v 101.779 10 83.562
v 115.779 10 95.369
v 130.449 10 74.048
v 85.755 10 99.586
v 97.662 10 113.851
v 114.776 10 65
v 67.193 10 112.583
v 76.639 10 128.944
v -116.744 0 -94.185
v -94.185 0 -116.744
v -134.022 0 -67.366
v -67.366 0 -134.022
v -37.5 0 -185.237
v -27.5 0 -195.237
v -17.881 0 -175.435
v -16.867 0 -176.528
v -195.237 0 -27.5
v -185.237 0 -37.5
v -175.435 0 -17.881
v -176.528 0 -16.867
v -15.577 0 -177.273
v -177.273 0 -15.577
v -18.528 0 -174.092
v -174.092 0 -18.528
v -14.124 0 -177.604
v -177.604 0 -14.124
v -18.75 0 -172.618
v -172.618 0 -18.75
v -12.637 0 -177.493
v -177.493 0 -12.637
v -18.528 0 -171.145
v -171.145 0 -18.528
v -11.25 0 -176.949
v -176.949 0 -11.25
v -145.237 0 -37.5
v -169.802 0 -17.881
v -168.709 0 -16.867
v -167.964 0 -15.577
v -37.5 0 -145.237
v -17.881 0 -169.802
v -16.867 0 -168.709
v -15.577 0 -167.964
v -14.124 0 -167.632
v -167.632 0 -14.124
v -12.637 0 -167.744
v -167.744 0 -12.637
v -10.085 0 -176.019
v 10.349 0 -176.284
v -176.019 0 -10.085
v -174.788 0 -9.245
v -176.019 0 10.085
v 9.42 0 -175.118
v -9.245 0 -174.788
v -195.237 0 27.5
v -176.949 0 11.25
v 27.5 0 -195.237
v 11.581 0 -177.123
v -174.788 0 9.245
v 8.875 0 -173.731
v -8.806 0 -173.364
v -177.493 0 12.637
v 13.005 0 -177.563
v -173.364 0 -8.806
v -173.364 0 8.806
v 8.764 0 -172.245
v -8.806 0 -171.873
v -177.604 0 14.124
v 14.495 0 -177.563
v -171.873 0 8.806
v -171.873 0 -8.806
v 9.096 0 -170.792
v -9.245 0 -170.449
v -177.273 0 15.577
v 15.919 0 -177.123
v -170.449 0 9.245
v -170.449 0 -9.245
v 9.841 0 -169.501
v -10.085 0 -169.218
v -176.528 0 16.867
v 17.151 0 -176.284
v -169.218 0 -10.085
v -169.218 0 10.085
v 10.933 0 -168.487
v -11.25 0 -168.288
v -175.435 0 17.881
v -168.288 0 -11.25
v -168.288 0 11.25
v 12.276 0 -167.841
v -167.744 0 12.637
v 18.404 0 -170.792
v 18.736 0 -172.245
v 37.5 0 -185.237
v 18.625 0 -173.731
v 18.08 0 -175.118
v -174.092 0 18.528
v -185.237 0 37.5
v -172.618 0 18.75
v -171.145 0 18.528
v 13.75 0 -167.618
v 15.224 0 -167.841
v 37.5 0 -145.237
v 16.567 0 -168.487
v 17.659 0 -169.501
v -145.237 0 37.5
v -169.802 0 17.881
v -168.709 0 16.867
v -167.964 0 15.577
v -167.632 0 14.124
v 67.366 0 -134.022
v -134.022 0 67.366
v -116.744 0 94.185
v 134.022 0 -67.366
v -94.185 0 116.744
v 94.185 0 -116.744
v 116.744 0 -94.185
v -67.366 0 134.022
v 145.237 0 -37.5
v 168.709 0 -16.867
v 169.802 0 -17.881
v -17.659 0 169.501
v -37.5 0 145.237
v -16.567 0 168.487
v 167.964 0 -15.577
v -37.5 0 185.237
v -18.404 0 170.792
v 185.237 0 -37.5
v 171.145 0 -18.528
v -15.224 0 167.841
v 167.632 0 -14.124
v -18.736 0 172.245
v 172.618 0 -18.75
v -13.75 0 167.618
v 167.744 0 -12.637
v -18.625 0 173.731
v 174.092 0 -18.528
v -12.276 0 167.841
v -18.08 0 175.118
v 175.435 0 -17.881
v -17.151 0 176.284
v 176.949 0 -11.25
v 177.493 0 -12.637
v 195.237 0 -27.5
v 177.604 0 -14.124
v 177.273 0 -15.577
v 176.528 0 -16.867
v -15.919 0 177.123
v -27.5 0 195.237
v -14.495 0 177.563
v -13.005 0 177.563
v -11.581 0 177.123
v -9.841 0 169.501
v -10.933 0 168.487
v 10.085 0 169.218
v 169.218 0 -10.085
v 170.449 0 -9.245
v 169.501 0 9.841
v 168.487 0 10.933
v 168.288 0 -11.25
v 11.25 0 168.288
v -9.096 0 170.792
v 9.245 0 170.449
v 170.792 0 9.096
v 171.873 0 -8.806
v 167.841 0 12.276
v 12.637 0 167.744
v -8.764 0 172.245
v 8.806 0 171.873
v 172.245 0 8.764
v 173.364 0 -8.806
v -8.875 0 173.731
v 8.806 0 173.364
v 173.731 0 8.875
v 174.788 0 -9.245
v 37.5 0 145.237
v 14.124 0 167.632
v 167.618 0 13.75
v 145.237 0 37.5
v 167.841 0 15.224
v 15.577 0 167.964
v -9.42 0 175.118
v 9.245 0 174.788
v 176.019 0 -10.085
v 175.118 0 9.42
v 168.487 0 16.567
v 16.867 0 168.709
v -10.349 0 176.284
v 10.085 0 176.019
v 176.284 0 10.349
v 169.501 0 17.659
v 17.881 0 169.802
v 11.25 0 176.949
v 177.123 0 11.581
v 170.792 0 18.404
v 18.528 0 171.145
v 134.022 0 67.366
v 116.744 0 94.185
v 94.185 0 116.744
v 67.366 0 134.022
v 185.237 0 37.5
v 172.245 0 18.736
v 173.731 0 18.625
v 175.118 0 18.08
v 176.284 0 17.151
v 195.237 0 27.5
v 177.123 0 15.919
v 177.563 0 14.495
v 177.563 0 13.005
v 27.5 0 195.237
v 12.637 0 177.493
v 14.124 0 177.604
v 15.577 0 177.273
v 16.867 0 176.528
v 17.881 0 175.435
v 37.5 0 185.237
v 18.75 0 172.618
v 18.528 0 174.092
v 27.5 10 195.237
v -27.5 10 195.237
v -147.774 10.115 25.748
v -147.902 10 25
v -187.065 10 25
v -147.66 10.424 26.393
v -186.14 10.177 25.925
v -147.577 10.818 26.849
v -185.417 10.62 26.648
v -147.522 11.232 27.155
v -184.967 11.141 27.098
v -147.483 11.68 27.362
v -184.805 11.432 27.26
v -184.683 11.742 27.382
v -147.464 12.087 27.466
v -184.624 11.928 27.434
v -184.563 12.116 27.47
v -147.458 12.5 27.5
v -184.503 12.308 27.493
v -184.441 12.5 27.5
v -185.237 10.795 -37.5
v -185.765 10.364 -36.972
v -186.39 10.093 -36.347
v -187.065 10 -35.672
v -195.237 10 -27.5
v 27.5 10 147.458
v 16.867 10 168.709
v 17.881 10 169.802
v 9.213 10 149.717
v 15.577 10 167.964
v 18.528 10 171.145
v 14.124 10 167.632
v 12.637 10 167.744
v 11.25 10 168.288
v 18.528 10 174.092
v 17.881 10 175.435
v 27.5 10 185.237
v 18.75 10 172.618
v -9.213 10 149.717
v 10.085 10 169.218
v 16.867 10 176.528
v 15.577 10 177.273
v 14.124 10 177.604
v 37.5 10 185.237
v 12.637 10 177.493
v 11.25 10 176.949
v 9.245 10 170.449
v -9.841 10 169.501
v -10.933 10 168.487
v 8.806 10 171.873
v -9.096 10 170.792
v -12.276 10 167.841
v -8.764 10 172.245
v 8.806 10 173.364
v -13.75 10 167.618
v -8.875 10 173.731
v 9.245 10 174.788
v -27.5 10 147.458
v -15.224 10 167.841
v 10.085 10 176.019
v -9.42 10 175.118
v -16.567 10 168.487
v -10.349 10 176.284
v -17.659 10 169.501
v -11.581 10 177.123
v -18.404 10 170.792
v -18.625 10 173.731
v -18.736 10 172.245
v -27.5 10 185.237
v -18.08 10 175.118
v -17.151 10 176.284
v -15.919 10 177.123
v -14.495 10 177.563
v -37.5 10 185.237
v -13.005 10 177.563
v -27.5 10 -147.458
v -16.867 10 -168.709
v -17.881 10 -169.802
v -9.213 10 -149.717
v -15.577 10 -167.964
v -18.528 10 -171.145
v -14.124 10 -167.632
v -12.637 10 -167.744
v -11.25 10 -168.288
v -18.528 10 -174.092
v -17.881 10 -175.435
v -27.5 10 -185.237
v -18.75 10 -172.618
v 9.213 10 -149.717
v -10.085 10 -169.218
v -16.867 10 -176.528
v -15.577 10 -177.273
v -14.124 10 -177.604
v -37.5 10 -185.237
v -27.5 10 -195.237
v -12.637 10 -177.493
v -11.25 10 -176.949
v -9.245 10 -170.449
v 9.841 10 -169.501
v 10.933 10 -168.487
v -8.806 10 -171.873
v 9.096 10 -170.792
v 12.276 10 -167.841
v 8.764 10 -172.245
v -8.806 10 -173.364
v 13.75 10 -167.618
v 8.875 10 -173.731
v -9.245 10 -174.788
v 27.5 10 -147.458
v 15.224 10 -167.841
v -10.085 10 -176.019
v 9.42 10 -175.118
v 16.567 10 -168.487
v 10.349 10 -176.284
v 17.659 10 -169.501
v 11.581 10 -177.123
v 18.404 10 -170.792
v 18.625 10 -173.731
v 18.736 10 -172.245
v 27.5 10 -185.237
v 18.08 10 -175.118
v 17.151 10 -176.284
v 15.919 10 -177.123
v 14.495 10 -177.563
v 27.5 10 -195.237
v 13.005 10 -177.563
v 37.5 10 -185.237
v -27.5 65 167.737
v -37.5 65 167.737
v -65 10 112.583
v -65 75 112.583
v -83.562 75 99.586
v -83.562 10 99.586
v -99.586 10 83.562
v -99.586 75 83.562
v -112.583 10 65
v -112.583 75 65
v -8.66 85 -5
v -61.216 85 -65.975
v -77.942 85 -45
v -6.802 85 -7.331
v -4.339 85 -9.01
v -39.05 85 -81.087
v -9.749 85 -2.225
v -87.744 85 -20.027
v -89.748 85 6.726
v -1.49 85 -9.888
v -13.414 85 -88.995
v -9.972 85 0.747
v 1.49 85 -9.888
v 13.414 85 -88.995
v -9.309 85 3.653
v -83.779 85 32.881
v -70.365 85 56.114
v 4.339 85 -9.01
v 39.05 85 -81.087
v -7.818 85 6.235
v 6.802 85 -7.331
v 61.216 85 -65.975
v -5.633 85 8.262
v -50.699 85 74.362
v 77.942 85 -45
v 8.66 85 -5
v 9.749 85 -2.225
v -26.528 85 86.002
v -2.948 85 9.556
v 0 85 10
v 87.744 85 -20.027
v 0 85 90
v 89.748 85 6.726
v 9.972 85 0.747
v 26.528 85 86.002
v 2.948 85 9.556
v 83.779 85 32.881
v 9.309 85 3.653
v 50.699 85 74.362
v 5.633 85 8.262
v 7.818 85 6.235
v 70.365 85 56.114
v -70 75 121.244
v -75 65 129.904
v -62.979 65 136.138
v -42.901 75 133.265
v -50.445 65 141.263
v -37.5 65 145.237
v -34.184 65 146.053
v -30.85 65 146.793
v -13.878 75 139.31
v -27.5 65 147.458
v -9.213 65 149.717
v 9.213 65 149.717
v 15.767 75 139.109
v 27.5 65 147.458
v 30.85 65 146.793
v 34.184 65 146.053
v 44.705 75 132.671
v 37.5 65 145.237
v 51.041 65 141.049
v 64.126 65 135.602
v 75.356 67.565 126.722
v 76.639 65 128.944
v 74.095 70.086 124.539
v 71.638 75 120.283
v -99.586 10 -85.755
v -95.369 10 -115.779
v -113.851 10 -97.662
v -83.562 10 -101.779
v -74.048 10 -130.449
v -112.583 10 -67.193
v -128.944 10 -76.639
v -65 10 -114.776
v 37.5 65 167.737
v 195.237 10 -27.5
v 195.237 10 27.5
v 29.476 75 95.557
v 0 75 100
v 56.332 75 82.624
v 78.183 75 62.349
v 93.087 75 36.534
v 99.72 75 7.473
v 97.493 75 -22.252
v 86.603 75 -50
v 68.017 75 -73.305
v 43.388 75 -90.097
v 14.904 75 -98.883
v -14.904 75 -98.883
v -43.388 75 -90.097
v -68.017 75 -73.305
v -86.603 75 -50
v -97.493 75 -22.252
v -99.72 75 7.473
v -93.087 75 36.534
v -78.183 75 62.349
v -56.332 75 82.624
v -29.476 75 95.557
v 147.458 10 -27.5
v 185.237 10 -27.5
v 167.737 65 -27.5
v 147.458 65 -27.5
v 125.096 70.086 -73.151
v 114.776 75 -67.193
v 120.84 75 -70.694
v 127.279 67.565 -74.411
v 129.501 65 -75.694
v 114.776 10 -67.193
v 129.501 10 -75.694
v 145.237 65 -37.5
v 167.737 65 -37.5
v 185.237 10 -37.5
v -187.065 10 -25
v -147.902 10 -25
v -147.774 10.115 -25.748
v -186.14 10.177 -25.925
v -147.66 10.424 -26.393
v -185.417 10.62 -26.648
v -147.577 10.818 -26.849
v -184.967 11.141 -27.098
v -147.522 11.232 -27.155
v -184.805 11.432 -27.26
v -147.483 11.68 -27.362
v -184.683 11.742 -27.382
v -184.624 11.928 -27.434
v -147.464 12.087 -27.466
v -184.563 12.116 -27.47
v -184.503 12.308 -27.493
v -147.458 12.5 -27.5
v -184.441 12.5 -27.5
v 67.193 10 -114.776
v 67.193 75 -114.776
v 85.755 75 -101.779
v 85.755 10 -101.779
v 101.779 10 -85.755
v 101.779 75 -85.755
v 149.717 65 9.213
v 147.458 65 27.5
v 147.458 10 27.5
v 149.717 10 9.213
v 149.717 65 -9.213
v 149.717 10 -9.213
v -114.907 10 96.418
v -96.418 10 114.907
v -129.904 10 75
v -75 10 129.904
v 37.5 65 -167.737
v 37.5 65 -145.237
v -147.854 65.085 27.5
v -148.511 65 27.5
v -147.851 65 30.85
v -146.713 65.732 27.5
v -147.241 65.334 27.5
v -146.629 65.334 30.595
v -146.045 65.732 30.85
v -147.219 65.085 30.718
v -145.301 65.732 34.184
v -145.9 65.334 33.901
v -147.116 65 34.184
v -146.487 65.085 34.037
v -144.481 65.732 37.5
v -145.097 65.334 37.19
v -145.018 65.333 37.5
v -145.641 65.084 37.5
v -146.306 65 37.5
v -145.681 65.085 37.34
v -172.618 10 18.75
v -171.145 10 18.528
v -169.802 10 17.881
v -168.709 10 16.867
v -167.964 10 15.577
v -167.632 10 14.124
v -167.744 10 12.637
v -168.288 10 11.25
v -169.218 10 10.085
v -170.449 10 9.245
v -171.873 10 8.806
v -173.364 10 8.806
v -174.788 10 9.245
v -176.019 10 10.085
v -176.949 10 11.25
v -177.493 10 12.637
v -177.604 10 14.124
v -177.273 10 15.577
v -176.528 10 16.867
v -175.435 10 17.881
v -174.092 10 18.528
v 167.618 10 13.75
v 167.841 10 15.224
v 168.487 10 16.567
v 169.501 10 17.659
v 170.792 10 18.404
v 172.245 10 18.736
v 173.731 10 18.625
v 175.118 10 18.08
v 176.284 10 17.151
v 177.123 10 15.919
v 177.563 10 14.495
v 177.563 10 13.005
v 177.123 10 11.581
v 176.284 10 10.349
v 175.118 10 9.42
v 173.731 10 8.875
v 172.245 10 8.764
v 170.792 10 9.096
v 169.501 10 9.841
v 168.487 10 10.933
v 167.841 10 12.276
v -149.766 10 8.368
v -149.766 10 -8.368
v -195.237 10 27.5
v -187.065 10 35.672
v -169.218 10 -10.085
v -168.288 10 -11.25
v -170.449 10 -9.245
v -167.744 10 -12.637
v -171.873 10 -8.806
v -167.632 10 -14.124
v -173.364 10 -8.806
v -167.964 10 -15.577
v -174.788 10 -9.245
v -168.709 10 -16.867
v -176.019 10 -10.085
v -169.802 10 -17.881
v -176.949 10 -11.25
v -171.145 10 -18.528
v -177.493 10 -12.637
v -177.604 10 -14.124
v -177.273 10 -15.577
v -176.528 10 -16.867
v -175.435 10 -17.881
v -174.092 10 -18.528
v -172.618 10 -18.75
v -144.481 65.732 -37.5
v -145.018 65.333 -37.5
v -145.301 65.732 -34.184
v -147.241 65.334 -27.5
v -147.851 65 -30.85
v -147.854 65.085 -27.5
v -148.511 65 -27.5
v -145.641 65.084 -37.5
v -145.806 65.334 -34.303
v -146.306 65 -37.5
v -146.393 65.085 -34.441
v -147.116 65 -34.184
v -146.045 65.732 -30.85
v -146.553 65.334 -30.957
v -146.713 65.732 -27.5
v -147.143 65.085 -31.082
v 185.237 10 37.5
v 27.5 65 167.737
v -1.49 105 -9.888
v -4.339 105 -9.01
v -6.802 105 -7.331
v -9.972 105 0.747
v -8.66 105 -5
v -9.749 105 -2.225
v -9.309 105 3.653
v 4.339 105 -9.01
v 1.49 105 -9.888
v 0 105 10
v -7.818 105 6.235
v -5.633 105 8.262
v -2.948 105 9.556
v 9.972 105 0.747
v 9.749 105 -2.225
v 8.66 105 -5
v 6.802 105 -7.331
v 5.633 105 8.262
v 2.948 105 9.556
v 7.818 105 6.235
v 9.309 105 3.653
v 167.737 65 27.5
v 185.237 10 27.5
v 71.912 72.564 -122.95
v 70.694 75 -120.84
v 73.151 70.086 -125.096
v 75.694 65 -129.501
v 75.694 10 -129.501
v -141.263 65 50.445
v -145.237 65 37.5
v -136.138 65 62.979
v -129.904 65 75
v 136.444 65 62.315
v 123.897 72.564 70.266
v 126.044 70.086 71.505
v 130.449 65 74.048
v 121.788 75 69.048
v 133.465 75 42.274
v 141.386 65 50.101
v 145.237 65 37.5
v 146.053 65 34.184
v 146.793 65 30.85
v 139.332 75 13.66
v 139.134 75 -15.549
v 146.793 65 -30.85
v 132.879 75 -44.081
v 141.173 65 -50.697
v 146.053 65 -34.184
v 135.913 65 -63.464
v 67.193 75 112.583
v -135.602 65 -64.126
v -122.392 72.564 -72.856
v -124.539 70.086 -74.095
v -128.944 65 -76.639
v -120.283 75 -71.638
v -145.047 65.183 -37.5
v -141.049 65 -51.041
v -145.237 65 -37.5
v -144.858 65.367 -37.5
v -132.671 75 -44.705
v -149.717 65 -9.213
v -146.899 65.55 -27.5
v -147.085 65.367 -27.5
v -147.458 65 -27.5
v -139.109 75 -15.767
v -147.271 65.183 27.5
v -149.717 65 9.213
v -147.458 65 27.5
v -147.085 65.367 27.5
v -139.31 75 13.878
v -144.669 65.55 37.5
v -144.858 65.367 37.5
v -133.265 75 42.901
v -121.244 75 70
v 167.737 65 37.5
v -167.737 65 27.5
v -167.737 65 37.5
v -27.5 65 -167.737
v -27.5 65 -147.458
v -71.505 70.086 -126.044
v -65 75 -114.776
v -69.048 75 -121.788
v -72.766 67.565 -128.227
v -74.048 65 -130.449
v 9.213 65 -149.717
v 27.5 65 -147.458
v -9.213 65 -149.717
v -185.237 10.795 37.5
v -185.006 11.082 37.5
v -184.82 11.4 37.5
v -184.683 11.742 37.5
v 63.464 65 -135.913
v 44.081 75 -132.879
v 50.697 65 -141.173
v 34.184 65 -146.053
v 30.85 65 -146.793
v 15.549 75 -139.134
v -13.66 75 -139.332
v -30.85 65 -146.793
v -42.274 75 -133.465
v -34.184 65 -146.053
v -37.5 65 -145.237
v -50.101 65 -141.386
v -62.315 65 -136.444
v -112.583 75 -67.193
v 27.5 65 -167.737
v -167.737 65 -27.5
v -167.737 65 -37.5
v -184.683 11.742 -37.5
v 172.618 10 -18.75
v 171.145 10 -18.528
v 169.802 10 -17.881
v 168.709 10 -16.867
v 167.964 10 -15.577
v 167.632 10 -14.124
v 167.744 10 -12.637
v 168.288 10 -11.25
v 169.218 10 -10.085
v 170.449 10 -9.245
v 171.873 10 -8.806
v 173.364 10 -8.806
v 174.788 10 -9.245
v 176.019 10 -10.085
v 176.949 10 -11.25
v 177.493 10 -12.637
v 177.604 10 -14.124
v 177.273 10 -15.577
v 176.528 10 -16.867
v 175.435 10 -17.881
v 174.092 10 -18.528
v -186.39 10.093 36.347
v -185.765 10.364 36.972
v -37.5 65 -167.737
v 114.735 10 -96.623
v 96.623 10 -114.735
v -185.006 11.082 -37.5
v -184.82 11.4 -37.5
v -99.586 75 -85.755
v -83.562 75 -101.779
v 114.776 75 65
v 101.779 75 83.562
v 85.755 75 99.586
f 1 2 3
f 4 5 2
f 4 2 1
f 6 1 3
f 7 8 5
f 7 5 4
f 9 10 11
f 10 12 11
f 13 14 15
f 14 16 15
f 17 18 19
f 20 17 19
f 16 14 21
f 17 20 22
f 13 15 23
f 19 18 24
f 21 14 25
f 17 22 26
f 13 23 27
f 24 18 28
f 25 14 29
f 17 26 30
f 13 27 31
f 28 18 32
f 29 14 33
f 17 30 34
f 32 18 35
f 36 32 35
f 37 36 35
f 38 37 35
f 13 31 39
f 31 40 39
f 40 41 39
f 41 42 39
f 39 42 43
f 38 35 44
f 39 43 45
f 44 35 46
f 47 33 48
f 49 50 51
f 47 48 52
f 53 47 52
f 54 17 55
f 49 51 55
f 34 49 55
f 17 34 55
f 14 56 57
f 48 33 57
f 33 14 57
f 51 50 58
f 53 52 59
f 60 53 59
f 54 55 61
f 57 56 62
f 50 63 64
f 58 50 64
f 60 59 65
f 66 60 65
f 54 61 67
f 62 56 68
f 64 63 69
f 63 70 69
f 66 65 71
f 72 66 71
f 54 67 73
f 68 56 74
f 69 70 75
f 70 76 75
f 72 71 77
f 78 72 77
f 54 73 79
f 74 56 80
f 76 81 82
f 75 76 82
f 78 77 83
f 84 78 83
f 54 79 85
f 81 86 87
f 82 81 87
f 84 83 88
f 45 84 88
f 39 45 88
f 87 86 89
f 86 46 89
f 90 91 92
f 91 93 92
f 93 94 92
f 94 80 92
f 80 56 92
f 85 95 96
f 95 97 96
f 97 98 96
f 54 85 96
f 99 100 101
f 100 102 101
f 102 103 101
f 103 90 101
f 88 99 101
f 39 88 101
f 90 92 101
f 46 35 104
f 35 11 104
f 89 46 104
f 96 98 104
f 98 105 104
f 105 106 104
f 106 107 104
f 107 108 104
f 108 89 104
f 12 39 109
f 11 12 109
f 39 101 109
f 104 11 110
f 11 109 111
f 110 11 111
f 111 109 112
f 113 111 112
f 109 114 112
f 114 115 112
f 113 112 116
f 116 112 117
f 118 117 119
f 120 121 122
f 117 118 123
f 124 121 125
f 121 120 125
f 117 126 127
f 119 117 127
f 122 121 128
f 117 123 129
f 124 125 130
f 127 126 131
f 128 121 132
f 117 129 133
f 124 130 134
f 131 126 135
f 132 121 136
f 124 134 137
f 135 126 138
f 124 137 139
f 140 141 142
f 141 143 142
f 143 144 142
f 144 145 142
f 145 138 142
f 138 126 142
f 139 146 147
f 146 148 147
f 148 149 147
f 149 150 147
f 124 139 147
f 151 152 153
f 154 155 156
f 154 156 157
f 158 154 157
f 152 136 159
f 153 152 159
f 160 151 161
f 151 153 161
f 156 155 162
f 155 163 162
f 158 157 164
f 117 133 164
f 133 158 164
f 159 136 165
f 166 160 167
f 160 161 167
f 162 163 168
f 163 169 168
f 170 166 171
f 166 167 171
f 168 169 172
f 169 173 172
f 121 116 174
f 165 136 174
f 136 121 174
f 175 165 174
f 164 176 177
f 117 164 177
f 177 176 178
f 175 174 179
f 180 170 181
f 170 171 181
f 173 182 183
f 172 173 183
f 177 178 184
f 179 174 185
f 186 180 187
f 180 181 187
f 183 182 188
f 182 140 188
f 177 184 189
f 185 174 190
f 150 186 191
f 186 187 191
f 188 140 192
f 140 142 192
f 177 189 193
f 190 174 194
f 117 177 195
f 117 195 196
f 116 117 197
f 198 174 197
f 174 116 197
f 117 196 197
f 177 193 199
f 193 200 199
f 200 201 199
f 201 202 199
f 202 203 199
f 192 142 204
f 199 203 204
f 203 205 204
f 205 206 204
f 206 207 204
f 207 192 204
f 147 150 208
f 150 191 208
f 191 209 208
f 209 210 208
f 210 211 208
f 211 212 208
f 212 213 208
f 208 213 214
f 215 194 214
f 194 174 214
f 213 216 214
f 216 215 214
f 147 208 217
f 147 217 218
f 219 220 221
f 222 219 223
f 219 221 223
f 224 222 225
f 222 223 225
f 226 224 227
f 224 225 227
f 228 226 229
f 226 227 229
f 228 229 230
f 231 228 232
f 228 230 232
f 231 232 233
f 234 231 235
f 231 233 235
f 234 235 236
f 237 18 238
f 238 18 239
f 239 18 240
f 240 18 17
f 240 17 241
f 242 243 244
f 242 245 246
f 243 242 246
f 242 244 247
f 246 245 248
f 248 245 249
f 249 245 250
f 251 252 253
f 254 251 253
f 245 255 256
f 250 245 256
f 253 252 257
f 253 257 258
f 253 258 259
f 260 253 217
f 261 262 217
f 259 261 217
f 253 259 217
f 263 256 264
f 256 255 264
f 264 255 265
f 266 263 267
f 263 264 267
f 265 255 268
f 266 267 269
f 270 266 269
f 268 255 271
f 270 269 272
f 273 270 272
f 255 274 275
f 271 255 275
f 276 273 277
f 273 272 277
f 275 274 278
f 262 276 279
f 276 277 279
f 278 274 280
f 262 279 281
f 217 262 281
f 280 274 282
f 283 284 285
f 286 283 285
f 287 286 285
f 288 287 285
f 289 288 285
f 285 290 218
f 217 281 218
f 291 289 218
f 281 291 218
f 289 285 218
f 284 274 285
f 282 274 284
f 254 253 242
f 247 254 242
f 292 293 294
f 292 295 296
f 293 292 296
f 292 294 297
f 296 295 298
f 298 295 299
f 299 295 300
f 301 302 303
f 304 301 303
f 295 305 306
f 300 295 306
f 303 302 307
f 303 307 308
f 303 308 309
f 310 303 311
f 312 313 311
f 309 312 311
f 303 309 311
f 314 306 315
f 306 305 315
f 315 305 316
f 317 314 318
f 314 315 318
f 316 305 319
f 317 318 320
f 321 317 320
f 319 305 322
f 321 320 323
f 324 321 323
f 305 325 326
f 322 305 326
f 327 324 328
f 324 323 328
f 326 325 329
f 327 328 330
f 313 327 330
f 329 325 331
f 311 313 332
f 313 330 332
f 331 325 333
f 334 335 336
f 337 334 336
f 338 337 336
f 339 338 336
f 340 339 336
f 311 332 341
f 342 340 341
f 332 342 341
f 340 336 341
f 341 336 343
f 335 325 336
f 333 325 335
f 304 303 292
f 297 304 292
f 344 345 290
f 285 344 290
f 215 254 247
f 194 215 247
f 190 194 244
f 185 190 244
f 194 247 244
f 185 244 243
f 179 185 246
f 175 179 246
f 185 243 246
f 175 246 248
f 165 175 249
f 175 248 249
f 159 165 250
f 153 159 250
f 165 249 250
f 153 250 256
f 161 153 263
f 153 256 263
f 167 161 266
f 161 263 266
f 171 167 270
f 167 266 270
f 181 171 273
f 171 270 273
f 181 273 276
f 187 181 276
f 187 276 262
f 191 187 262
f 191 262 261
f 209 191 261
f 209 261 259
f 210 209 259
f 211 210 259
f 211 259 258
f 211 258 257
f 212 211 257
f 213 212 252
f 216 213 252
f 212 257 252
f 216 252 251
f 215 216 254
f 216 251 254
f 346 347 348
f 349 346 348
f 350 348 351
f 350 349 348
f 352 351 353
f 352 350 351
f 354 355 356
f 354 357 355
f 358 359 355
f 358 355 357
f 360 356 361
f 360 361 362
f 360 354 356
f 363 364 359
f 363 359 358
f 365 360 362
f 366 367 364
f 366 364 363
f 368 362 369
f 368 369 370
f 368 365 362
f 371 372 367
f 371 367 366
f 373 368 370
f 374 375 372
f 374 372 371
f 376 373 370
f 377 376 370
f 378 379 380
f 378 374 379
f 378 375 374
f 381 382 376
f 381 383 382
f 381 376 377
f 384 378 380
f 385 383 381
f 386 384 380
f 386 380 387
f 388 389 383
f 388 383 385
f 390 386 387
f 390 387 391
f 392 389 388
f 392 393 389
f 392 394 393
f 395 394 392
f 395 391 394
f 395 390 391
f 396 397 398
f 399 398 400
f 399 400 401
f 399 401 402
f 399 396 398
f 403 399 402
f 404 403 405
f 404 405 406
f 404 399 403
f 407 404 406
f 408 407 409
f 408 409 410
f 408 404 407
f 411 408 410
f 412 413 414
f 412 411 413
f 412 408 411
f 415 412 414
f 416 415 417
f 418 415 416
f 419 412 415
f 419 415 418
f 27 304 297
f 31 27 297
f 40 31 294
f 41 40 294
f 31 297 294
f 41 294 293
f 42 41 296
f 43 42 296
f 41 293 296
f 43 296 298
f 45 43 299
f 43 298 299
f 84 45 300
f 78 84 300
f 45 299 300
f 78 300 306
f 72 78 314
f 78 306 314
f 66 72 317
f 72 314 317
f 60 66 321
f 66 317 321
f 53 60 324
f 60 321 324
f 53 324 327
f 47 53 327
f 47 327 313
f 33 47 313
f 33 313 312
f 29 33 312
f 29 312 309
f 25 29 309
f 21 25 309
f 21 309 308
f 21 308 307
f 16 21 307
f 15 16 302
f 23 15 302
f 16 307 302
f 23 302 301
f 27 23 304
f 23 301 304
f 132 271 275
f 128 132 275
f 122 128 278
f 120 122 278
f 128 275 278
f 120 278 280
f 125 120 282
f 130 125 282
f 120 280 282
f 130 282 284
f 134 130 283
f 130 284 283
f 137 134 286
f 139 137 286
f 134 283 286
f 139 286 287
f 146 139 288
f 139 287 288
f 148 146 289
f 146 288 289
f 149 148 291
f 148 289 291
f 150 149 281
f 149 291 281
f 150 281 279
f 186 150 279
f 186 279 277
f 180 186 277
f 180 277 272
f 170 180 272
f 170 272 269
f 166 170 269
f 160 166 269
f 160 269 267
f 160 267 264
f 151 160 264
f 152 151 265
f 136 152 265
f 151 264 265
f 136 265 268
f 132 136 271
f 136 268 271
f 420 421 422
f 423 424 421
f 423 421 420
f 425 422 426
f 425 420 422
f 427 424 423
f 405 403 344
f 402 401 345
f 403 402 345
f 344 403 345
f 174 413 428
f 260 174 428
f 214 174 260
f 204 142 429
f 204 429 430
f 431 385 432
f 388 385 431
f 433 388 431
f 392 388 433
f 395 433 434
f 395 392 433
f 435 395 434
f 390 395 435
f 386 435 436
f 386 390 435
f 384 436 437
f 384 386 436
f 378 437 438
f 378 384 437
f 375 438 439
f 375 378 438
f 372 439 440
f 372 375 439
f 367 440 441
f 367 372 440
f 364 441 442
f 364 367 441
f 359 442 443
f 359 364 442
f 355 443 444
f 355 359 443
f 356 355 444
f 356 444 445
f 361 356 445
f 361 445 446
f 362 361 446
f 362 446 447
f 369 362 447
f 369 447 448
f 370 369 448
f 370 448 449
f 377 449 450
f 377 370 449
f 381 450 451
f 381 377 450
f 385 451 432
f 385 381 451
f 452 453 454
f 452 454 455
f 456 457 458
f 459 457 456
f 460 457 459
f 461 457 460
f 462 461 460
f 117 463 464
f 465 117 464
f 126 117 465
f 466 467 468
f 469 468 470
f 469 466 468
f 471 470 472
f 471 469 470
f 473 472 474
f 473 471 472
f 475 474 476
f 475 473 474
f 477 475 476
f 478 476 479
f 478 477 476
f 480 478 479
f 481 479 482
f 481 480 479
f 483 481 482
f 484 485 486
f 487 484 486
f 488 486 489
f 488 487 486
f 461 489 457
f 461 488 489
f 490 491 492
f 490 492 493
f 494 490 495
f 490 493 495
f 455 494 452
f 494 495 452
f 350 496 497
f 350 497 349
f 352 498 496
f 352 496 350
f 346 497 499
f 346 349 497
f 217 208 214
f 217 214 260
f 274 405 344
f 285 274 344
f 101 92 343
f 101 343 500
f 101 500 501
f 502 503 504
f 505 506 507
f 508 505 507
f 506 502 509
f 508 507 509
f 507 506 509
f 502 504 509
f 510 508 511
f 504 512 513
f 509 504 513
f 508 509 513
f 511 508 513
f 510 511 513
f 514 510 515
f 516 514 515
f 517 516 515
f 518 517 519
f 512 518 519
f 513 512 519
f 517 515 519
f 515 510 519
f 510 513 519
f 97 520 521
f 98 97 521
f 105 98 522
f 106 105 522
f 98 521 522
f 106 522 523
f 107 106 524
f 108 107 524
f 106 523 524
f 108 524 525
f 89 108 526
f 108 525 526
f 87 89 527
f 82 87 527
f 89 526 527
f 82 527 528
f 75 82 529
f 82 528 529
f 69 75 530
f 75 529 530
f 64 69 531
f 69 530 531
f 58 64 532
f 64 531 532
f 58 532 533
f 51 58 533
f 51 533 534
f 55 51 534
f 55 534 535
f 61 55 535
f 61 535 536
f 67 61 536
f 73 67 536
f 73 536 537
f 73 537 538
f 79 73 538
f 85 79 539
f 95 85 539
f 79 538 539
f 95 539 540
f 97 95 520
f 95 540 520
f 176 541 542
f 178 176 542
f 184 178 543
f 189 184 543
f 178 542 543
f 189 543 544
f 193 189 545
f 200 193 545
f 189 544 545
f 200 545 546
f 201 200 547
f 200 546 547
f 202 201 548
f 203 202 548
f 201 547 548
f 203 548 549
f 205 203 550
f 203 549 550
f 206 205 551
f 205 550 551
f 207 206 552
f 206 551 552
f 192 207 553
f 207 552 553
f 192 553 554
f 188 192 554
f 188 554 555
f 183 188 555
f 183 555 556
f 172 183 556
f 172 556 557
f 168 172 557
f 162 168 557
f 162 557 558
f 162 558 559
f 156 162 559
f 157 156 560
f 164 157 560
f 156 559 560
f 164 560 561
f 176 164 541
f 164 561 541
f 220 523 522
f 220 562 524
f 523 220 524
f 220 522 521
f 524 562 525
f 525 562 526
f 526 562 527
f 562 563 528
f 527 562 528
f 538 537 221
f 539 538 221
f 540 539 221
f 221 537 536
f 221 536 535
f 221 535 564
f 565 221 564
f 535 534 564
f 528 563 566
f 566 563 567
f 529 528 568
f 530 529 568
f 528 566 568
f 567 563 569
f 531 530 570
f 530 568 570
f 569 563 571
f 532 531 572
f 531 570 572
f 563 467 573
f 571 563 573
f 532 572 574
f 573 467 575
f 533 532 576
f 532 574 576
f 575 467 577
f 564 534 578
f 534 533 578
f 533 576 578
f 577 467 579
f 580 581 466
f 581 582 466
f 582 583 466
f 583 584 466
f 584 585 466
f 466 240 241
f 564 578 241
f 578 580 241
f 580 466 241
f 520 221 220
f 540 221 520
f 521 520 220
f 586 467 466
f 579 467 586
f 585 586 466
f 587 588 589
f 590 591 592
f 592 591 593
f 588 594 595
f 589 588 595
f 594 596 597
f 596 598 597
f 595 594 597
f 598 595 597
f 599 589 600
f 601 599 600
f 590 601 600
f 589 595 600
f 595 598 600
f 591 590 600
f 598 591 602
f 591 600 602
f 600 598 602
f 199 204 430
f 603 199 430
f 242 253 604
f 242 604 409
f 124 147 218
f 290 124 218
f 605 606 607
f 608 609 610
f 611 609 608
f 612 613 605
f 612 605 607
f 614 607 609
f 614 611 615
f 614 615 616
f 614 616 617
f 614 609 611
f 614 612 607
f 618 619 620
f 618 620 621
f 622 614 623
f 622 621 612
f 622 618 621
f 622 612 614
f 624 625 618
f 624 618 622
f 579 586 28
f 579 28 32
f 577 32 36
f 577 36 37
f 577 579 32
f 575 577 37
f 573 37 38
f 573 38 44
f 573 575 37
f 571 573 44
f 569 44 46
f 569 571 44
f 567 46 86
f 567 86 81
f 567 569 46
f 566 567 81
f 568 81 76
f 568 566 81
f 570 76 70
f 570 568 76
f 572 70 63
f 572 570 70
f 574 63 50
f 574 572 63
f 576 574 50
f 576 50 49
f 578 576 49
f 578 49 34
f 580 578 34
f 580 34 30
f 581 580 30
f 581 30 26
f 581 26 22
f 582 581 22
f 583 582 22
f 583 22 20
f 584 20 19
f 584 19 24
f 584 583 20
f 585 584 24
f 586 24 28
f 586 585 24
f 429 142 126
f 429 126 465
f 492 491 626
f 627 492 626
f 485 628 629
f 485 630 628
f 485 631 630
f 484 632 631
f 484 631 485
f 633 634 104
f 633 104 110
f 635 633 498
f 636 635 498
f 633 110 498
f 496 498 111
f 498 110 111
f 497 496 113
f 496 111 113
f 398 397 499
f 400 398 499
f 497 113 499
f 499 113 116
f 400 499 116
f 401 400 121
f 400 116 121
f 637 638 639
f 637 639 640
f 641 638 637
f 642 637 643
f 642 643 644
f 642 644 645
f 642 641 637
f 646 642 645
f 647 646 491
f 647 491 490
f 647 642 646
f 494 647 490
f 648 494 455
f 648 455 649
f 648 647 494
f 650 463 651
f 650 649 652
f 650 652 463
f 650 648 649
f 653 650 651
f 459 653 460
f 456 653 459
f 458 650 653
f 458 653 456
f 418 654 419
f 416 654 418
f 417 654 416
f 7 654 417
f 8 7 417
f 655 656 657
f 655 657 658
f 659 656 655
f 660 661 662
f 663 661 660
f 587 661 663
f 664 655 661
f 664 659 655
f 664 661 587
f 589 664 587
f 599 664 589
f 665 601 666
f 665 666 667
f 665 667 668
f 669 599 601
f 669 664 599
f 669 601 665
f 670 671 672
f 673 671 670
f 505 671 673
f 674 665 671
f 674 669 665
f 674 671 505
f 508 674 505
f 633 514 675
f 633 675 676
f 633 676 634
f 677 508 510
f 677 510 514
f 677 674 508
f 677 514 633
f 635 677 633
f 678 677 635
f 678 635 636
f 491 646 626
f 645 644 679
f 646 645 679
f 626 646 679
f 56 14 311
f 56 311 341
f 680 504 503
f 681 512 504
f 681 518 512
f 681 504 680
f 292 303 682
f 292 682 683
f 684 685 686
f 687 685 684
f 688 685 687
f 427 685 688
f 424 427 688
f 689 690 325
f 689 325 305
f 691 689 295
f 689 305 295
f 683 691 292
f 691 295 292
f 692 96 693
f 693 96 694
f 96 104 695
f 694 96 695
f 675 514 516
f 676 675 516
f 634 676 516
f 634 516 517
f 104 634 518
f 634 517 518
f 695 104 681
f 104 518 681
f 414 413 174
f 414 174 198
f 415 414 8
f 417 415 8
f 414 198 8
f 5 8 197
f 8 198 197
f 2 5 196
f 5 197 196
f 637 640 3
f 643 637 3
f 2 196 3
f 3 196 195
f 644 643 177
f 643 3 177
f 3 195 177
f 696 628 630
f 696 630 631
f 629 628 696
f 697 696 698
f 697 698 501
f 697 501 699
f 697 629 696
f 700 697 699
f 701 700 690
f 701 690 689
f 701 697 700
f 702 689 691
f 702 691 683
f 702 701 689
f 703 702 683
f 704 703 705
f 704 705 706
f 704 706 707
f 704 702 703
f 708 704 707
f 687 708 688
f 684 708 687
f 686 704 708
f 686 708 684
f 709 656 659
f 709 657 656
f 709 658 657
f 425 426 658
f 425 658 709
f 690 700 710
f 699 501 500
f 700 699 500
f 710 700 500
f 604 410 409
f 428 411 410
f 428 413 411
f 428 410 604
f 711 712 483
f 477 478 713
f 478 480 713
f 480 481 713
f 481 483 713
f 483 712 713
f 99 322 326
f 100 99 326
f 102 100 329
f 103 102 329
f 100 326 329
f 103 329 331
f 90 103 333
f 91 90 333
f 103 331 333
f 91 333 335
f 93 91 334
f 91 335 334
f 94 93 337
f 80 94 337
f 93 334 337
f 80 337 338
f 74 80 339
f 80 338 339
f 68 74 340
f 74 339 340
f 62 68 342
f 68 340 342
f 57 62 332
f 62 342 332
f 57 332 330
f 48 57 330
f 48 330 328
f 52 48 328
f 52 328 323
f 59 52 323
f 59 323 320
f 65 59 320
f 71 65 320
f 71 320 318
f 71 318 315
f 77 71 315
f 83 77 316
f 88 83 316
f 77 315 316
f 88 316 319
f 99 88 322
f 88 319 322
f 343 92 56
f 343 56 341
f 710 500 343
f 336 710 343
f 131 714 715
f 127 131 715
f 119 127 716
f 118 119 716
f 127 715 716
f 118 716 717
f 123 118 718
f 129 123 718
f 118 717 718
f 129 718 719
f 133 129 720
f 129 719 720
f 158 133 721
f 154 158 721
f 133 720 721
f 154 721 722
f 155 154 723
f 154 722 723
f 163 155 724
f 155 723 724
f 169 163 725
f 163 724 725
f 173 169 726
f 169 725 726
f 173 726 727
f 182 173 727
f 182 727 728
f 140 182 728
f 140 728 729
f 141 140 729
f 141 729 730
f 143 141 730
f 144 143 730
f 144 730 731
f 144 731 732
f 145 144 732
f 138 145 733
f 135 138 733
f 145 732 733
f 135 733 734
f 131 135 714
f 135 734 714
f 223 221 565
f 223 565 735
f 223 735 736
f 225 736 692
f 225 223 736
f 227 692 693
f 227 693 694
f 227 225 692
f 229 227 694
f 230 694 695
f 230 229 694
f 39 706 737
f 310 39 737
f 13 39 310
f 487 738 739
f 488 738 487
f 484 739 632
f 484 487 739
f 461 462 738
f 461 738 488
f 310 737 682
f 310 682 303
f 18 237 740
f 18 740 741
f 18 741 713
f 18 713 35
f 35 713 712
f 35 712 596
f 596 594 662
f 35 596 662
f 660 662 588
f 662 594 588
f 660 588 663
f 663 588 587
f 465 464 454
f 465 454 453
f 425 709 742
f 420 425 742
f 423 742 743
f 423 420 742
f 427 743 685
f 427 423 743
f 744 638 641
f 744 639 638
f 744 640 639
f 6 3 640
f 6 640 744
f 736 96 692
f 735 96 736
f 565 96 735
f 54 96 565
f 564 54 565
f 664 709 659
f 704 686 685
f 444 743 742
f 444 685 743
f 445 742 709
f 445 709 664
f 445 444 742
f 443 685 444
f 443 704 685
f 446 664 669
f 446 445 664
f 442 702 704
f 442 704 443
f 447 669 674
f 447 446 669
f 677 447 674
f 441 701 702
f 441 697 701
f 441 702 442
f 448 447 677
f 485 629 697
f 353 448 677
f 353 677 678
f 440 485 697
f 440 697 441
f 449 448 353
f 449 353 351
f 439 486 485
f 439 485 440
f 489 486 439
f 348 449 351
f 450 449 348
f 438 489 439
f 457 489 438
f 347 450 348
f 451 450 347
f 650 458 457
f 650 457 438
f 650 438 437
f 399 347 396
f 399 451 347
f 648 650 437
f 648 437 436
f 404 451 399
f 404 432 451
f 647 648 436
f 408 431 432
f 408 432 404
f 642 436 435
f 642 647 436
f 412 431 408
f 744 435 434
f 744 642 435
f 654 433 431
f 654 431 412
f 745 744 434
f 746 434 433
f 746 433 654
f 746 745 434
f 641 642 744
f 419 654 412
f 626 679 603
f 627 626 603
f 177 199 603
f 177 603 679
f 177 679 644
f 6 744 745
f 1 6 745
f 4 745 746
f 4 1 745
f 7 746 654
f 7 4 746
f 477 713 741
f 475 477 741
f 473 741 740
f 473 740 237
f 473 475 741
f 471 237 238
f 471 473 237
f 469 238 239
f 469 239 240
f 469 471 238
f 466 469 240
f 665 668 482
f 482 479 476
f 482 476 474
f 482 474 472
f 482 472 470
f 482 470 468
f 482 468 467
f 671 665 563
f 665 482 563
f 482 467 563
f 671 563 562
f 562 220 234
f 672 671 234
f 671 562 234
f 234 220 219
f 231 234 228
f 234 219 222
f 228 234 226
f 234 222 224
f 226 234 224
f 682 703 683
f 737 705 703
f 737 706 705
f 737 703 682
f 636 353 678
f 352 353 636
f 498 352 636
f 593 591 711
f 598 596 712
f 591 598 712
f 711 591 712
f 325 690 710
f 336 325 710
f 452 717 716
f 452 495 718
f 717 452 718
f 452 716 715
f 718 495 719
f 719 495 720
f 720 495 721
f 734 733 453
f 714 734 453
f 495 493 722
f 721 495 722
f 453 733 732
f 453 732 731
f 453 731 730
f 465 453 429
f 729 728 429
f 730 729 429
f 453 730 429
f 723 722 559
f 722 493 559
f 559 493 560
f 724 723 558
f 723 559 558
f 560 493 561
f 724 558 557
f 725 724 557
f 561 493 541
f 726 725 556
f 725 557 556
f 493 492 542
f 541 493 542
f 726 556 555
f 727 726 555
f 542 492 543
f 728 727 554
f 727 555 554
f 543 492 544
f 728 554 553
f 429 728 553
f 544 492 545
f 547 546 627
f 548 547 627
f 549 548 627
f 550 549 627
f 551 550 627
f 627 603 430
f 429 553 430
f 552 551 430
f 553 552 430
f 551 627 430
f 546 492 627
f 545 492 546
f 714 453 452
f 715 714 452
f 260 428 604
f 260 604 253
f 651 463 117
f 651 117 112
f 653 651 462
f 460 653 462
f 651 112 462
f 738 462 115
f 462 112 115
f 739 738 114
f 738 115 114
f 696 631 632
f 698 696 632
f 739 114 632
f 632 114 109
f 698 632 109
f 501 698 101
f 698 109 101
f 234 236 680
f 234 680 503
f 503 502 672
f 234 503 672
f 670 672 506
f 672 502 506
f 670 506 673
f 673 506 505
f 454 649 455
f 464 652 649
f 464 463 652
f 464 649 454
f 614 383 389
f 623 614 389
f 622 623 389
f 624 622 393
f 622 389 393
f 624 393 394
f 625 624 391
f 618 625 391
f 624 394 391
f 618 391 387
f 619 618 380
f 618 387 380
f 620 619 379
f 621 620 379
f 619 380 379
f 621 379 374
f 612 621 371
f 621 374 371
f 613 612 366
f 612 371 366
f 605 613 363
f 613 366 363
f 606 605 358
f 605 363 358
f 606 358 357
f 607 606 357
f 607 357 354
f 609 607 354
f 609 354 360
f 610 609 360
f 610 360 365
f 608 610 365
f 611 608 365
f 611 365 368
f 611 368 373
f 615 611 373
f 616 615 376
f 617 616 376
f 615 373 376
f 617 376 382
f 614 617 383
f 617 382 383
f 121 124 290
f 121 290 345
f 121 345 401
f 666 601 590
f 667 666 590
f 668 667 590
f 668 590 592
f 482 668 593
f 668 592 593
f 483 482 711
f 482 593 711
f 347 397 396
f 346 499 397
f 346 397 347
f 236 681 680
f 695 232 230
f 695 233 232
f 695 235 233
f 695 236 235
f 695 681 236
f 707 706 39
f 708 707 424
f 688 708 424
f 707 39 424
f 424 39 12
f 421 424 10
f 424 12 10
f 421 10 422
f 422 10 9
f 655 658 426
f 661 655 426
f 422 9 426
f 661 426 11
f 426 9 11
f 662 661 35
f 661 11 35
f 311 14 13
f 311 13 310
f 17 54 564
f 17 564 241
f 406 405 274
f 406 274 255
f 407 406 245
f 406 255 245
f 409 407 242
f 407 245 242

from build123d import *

# Parameters (mm, degrees)
SKETCH1_R                    = 150
BOSS_EXTRUDE1_DEPTH          = 75
CHAMFER1_SIZE                = 10
BOSS_EXTRUDE2_START          = -75
BOSS_EXTRUDE2_DEPTH          = 10
CHAMFER2_SIZE                = 10
BOSS_EXTRUDE3_DEPTH          = 10
SKETCH4_R                    = 5
CUT_EXTRUDE1_DEPTH           = 10
FILLET1_R                    = 2.5
FILLET2_R                    = 2.5
FILLET3_R                    = 2.5
CIRPATTERN4_COUNT            = 4
CIRPATTERN4_COPY_1_DEPTH     = 10
CIRPATTERN4_COPY_2_DEPTH     = 10
CIRPATTERN4_COPY_3_DEPTH     = 10
CIRPATTERN4_COPY_4_SKETCH_R  = 5
CIRPATTERN4_COPY_4_DEPTH     = 10
CIRPATTERN4_COPY_5_SKETCH_R  = 5
CIRPATTERN4_COPY_5_DEPTH     = 10
CIRPATTERN4_COPY_6_SKETCH_R  = 5
CIRPATTERN4_COPY_6_DEPTH     = 10
CHAMFER2_OF_CIRPATTERN4_SIZE = 10
CUT_EXTRUDE2_START           = -65
CUT_EXTRUDE2_DEPTH           = 65
CIRPATTERN5_COUNT            = 4
SKETCH6_R                    = 100
BOSS_EXTRUDE4_DEPTH          = 10
CHAMFER3_SIZE                = 10
SKETCH7_R                    = 10
BOSS_EXTRUDE5_DEPTH          = 20


# Some blends are built 0.0001 mm under size
with BuildPart() as part:
    # Sketch1 → Boss-Extrude1 (new body)
    with BuildSketch(Plane(origin=(0, 0, 0), x_dir=(1, 0, 0), z_dir=(0, 1, 0))):
        with Locations(Location((0, 0, 0), (0, 0, 270))):
            Circle(SKETCH1_R)
    extrude(amount=BOSS_EXTRUDE1_DEPTH)

    # Chamfer1
    chamfer1_edges = [part.edges().sort_by_distance(p)[0] for p in [
        (0, 75, -150),
    ]]
    chamfer(chamfer1_edges, length=CHAMFER1_SIZE)

    # Sketch2 → Boss-Extrude2 (add)
    with BuildSketch(Plane(origin=(0, 75, 0), x_dir=(1, 0, 0), z_dir=(0, 1, 0)).offset(BOSS_EXTRUDE2_START)):
        with BuildLine():
            Line((-195.236875483, -37.5), (-195.236875483, 37.5))
            Line((-195.236875483, 37.5), (-145.236875483, 37.5))
            ThreePointArc((-145.236875483, 37.5), (-150, 0), (-145.236875483, -37.5))
            Line((-145.236875483, -37.5), (-195.236875483, -37.5))
        make_face()
    boss_extrude2 = extrude(amount=BOSS_EXTRUDE2_DEPTH)

    # Chamfer2
    chamfer2_edges = [part.edges().sort_by_distance(p)[0] for p in [
        (-195.236875483, 5, -37.5),
        (-195.236875483, 5, 37.5),
    ]]
    chamfer(chamfer2_edges, length=CHAMFER2_SIZE)

    # Sketch3 → Boss-Extrude3 (add)
    with BuildSketch(Plane.XY.offset(37.5)):
        Polygon((-145.236875483, 0), (-145.236875483, 65), (-167.736875483, 65), (-185.236875483, 10), (-185.236875483, 0), align=None)
    boss_extrude3 = extrude(amount=-BOSS_EXTRUDE3_DEPTH)

    # Sketch4 → Cut-Extrude1 (cut)
    with BuildSketch(Plane(origin=(0, 10, 0), x_dir=(1, 0, 0), z_dir=(0, 1, 0))):
        with Locations(Location((-172.618437741, -13.75, 0), (0, 0, 270))):
            Circle(SKETCH4_R)
    cut_extrude1 = extrude(amount=-CUT_EXTRUDE1_DEPTH, mode=Mode.SUBTRACT)

    # Mirror2: Boss-Extrude3, Cut-Extrude1 across plane
    add(boss_extrude3.mirror(Plane(origin=(0, 0, 0), x_dir=(1, 0, 0), z_dir=(0, 0, -1))))
    add(cut_extrude1.mirror(Plane(origin=(0, 0, 0), x_dir=(1, 0, 0), z_dir=(0, 0, -1))), mode=Mode.SUBTRACT)

    # Fillet1
    fillet1_edges = [part.edges().sort_by_distance(p)[0] for p in [
        (-166.347248257, 10, -27.5),
        (-185.236875483, 10, -32.5),
    ]]
    fillet(fillet1_edges, radius=FILLET1_R)

    # Fillet2
    fillet2_edges = [part.edges().sort_by_distance(p)[0] for p in [
        (-166.347248257, 10, 27.5),
        (-185.236875483, 10, 32.5),
    ]]
    fillet(fillet2_edges, radius=FILLET2_R)

    # Fillet3
    # the kernel refuses this fillet: 2.5 mm, written as the material it adds along each edge
    with BuildSketch(Plane(origin=(0, 65, 0), x_dir=(-0.9860683765202287, 0, 0.1663404846294499), z_dir=(-0.1663404846294499, 0, -0.9860683765202287))) as fillet3_piece_1_section:
        with BuildLine():
            CenterArc((150 + FILLET3_R * 0.414213562373, FILLET3_R), FILLET3_R, 225, 45)
            Line((150 + FILLET3_R * 0.414213562373, 0), (150, 0))
            Line((150, 0), (150 - FILLET3_R * 0.292893218813, FILLET3_R * 0.292893218813))
        make_face()
    fillet3_piece_1 = revolve(axis=Axis((0, 65, 0), (0, 1, 0)), revolution_arc=5.891260177, mode=Mode.PRIVATE)
    fillet3_piece_1 = split(fillet3_piece_1, bisect_by=Plane(origin=(-146.208853891, 65.259294833, 27.5), z_dir=(0, 0, 1)), keep=Keep.TOP, mode=Mode.PRIVATE)
    fillet3_piece_1 = split(fillet3_piece_1, bisect_by=Plane(origin=(-146.208853891, 65.259294833, 37.5), z_dir=(0, 0, -1)), keep=Keep.TOP, mode=Mode.PRIVATE)
    add(fillet3_piece_1)
    with BuildSketch(Plane(origin=(0, 65, 0), x_dir=(-0.9637871207414556, 0, -0.2666728068118214), z_dir=(0.2666728068118214, 0, -0.9637871207414556))) as fillet3_piece_2_section:
        with BuildLine():
            CenterArc((150 + FILLET3_R * 0.414213562373, FILLET3_R), FILLET3_R, 225, 45)
            Line((150 + FILLET3_R * 0.414213562373, 0), (150, 0))
            Line((150, 0), (150 - FILLET3_R * 0.292893218813, FILLET3_R * 0.292893218813))
        make_face()
    fillet3_piece_2 = revolve(axis=Axis((0, 65, 0), (0, 1, 0)), revolution_arc=5.891260177, mode=Mode.PRIVATE)
    fillet3_piece_2 = split(fillet3_piece_2, bisect_by=Plane(origin=(-146.20885389, 65.259294833, -27.5), z_dir=(0, 0, -1)), keep=Keep.TOP, mode=Mode.PRIVATE)
    fillet3_piece_2 = split(fillet3_piece_2, bisect_by=Plane(origin=(-146.20885389, 65.259294833, -37.5), z_dir=(0, 0, 1)), keep=Keep.TOP, mode=Mode.PRIVATE)
    add(fillet3_piece_2)

    # CirPattern4: Boss-Extrude2, Boss-Extrude3, Cut-Extrude1 ×4 about axis
    cirpattern4_axis = Axis((0, 0, 0), (0, 1, 0))
    add([boss_extrude2.rotate(cirpattern4_axis, i * 360 / CIRPATTERN4_COUNT) for i in range(1, CIRPATTERN4_COUNT)])
    add([boss_extrude3.rotate(cirpattern4_axis, i * 360 / CIRPATTERN4_COUNT) for i in range(1, CIRPATTERN4_COUNT)])
    add([cut_extrude1.rotate(cirpattern4_axis, i * 360 / CIRPATTERN4_COUNT) for i in range(1, CIRPATTERN4_COUNT)], mode=Mode.SUBTRACT)

    # CirPattern4 copy 1 sketch → CirPattern4 copy 1 (add)
    with BuildSketch(Plane(origin=(-37.5, 0, 0), x_dir=(0, 0, -1), z_dir=(-1, 0, 0))):
        Polygon((-145.236875483, 0), (-145.236875483, -65), (-167.736875483, -65), (-185.236875483, -10), (-185.236875483, 0), align=None)
    extrude(amount=-CIRPATTERN4_COPY_1_DEPTH)

    # CirPattern4 copy 2 sketch → CirPattern4 copy 2 (add)
    with BuildSketch(Plane(origin=(0, 0, 37.5), x_dir=(-1, 0, 0), z_dir=(0, 0, 1))):
        Polygon((-145.236875483, 0), (-145.236875483, -65), (-167.736875483, -65), (-185.236875483, -10), (-185.236875483, 0), align=None)
    extrude(amount=-CIRPATTERN4_COPY_2_DEPTH)

    # CirPattern4 copy 3 sketch → CirPattern4 copy 3 (add)
    with BuildSketch(Plane(origin=(37.5, 0, 0), x_dir=(0, 0, 1), z_dir=(1, 0, 0))):
        Polygon((-145.236875483, 0), (-145.236875483, -65), (-167.736875483, -65), (-185.236875483, -10), (-185.236875483, 0), align=None)
    extrude(amount=-CIRPATTERN4_COPY_3_DEPTH)

    # CirPattern4 copy 4 sketch → CirPattern4 copy 4 (cut)
    with BuildSketch(Plane(origin=(0, 10, 0), x_dir=(0, 0, -1), z_dir=(0, 1, 0))):
        with Locations((-172.618437741, 13.75)):
            Circle(CIRPATTERN4_COPY_4_SKETCH_R)
    extrude(amount=-CIRPATTERN4_COPY_4_DEPTH, mode=Mode.SUBTRACT)

    # CirPattern4 copy 5 sketch → CirPattern4 copy 5 (cut)
    with BuildSketch(Plane(origin=(0, 10, 0), x_dir=(-1, 0, 0), z_dir=(0, 1, 0))):
        with Locations((-172.618437741, 13.75)):
            Circle(CIRPATTERN4_COPY_5_SKETCH_R)
    extrude(amount=-CIRPATTERN4_COPY_5_DEPTH, mode=Mode.SUBTRACT)

    # CirPattern4 copy 6 sketch → CirPattern4 copy 6 (cut)
    with BuildSketch(Plane.ZX.offset(10)):
        with Locations((-172.618437741, 13.75)):
            Circle(CIRPATTERN4_COPY_6_SKETCH_R)
    extrude(amount=-CIRPATTERN4_COPY_6_DEPTH, mode=Mode.SUBTRACT)

    # Chamfer2 of CirPattern4
    chamfer2_of_cirpattern4_edges = [part.edges().sort_by_distance(p)[0] for p in [
        (-37.5, 5, 195.236875483),
        (37.5, 5, 195.236875483),
        (195.236875483, 5, 37.5),
        (195.236875483, 5, -37.5),
        (37.5, 5, -195.236875483),
        (-37.5, 5, -195.236875483),
    ]]
    chamfer(chamfer2_of_cirpattern4_edges, length=CHAMFER2_OF_CIRPATTERN4_SIZE)

    # Sketch5 → Cut-Extrude2 (cut)
    with BuildSketch(Plane(origin=(0, 75, 0), x_dir=(1, 0, 0), z_dir=(0, 1, 0)).offset(CUT_EXTRUDE2_START)):
        with BuildLine():
            Line((-112.583302492, -65), (-129.903810568, -75))
            ThreePointArc((-129.903810568, -75), (-106.066017178, -106.066017178), (-75, -129.903810568))
            Line((-75, -129.903810568), (-65, -112.583302492))
            ThreePointArc((-65, -112.583302492), (-91.923881554, -91.923881554), (-112.583302492, -65))
        make_face()
    cut_extrude2 = extrude(amount=CUT_EXTRUDE2_DEPTH, mode=Mode.SUBTRACT)

    # CirPattern5: Cut-Extrude2 ×4 about axis
    cirpattern5_axis = Axis((1.096442134, 0, -1.096442134), (0, 1, 0))
    for i in range(1, CIRPATTERN5_COUNT):
        add(cut_extrude2.rotate(cirpattern5_axis, i * 360 / CIRPATTERN5_COUNT), mode=Mode.SUBTRACT)

    # Sketch6 → Boss-Extrude4 (add)
    with BuildSketch(Plane(origin=(0, 75, 0), x_dir=(1, 0, 0), z_dir=(0, 1, 0))):
        with Locations(Location((0, 0, 0), (0, 0, 270))):
            Circle(SKETCH6_R)
    extrude(amount=BOSS_EXTRUDE4_DEPTH)

    # Chamfer3
    chamfer3_edges = [part.edges().sort_by_distance(p)[0] for p in [
        (0, 85, -100),
    ]]
    chamfer(chamfer3_edges, length=CHAMFER3_SIZE - 0.0001)  # a hair under: the kernel refuses the full size

    # Sketch7 → Boss-Extrude5 (add)
    with BuildSketch(Plane(origin=(0, 85, 0), x_dir=(1, 0, 0), z_dir=(0, 1, 0))):
        with Locations(Location((0, 0, 0), (0, 0, 270))):
            Circle(SKETCH7_R)
    extrude(amount=BOSS_EXTRUDE5_DEPTH)


solid = part.part
